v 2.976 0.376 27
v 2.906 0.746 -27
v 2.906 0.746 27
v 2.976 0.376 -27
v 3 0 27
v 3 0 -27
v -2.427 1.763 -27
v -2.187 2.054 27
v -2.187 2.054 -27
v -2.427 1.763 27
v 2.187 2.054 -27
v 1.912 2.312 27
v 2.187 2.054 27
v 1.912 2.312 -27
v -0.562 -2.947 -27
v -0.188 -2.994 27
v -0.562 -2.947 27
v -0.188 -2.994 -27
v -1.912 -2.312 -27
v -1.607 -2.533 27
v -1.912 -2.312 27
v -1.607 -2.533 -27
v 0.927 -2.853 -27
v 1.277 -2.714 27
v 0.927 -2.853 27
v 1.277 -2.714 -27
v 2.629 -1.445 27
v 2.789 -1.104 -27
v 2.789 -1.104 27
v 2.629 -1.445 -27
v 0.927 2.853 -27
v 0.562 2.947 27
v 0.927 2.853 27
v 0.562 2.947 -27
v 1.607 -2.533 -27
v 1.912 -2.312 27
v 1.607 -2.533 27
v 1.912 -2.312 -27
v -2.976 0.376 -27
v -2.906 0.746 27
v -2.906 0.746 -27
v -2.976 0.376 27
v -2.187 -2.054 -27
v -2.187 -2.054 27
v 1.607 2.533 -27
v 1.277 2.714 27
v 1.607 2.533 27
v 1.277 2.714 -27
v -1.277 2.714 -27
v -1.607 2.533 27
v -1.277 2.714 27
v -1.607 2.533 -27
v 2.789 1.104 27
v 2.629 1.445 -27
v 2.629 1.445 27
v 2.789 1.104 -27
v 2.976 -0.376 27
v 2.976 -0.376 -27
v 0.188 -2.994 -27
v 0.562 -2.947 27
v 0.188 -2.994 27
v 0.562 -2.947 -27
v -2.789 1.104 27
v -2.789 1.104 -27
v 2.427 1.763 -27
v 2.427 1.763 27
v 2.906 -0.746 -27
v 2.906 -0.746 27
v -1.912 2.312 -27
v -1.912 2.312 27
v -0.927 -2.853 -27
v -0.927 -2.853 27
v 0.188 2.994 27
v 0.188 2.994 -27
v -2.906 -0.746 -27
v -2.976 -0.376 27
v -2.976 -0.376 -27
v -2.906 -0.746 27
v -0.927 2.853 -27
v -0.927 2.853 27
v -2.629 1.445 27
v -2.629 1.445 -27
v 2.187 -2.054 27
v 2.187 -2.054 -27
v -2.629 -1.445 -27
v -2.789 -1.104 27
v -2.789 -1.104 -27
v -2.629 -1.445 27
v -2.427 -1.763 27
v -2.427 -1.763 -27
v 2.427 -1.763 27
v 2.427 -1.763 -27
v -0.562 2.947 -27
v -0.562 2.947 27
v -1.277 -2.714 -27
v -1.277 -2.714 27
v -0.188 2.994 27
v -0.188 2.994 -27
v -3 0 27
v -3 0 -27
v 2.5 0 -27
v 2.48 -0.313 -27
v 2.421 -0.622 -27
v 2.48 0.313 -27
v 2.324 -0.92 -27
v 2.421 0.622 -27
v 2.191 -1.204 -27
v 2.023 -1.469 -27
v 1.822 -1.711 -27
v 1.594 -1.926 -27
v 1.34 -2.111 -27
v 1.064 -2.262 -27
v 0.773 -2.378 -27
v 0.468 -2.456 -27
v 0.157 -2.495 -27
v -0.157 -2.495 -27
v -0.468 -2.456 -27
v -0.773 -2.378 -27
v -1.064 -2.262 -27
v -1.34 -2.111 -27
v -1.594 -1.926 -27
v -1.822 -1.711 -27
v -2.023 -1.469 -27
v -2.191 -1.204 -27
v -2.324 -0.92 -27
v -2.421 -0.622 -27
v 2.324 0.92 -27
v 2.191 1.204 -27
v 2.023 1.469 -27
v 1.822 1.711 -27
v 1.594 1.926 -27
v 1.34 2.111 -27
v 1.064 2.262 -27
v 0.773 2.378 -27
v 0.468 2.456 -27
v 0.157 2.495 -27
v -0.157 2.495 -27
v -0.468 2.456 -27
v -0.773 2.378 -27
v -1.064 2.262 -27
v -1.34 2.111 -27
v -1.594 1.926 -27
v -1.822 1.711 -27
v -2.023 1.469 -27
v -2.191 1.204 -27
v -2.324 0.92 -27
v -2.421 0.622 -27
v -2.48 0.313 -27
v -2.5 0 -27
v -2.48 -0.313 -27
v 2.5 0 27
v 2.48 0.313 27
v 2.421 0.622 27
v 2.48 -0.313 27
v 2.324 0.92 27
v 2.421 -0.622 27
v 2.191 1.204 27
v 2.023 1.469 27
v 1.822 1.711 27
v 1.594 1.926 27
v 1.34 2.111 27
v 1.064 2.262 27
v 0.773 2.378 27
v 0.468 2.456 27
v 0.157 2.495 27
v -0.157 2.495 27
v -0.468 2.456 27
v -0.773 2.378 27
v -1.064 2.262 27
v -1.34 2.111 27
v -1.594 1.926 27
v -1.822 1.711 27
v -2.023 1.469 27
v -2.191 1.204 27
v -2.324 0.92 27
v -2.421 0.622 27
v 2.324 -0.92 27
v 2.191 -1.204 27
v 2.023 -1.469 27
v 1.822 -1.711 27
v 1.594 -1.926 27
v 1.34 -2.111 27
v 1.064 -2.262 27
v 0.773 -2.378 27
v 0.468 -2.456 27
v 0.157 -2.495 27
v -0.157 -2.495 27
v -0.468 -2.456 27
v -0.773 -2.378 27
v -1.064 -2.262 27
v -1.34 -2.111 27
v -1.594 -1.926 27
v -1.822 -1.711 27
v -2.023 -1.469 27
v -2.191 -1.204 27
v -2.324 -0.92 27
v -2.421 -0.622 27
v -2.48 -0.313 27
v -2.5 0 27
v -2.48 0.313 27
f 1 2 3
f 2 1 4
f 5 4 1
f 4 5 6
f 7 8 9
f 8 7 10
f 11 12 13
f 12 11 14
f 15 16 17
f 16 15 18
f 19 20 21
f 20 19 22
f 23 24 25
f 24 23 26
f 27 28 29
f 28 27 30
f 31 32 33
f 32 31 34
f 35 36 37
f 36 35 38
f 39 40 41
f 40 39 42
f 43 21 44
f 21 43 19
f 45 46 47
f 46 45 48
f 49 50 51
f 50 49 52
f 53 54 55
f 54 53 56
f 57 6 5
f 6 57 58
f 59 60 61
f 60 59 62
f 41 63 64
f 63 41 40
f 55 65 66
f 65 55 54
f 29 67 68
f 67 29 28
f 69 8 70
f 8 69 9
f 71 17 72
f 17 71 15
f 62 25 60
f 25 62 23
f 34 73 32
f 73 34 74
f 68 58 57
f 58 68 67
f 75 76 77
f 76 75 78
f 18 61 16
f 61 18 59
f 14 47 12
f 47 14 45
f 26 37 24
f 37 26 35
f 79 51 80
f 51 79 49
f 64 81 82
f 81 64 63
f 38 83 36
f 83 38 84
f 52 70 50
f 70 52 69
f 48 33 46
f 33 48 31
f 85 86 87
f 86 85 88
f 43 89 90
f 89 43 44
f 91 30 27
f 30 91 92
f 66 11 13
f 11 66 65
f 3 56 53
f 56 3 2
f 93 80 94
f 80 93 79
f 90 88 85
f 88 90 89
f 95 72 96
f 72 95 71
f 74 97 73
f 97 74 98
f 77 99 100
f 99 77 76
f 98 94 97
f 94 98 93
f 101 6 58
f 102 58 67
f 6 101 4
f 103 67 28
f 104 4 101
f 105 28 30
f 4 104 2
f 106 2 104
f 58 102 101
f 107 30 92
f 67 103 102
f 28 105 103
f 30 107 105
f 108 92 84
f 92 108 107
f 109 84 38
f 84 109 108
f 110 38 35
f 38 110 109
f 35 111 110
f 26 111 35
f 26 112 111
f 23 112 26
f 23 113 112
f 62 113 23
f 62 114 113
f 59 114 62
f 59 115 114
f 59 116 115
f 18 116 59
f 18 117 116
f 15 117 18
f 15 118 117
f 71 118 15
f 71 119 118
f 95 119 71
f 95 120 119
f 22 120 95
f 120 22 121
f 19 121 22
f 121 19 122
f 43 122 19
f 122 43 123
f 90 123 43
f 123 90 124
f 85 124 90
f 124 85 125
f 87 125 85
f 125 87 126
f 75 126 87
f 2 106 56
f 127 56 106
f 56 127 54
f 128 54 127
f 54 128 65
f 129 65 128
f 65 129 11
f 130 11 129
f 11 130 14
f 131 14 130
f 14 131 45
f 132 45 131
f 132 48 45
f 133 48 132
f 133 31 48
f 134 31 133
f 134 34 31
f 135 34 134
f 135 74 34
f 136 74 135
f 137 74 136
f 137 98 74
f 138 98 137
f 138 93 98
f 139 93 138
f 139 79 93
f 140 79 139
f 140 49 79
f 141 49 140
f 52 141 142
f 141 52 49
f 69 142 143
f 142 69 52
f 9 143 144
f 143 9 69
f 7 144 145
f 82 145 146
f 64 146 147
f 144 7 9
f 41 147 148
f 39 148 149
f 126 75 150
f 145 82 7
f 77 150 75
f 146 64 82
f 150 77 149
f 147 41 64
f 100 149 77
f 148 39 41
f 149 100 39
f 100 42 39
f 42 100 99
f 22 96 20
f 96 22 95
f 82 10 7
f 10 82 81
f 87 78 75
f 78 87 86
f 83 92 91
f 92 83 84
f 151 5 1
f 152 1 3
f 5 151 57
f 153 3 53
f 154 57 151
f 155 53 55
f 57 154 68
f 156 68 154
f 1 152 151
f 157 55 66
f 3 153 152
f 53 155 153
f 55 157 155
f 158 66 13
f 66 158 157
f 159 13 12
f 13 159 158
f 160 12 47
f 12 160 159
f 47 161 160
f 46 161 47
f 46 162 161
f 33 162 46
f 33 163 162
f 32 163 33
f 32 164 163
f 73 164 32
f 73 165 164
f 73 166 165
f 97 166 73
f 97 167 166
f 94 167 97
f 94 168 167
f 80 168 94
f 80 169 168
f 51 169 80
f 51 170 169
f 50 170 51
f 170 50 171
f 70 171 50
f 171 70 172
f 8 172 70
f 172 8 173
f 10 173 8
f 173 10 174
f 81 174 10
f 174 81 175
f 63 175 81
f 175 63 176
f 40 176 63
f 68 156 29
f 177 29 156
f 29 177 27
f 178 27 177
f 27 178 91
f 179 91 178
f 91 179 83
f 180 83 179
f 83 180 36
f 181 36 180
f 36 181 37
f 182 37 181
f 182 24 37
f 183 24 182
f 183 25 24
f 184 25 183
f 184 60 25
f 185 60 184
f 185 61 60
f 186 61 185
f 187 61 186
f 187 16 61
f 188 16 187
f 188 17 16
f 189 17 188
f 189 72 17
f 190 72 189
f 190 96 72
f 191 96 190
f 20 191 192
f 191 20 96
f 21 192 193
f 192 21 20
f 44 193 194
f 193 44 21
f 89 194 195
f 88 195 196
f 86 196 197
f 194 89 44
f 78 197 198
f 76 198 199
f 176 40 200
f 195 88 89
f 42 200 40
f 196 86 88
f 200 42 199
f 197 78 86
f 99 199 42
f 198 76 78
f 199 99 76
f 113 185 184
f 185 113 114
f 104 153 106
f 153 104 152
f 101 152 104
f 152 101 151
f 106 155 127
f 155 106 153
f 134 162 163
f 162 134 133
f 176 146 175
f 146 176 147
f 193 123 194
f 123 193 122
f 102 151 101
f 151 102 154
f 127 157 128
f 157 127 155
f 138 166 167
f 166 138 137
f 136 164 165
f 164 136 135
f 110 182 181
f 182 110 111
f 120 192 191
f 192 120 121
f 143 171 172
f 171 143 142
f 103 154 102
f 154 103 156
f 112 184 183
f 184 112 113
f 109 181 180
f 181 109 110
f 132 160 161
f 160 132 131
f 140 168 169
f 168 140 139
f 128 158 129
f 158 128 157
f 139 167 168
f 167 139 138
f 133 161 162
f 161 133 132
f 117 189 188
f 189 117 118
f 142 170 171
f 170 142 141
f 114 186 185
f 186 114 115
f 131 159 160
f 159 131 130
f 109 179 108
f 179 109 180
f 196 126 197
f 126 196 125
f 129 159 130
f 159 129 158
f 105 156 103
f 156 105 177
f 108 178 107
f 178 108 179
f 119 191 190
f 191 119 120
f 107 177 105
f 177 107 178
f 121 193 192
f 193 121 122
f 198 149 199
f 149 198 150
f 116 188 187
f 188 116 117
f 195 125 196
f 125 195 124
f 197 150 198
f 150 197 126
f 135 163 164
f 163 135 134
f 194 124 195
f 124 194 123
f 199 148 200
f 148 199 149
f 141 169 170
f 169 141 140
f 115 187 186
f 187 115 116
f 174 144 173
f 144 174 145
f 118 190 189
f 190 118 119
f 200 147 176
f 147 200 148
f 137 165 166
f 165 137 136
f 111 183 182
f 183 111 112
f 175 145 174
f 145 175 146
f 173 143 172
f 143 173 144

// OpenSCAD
$fn = 50;


difference() {
	union() {
		translate(v = [0, 0, -27.0000000000]) {
			cylinder(h = 54, r = 3.0000000000);
		}
	}
	union() {
		translate(v = [0, 0, -100.0000000000]) {
			cylinder(h = 200, r = 2.5000000000);
		}
	}
}
